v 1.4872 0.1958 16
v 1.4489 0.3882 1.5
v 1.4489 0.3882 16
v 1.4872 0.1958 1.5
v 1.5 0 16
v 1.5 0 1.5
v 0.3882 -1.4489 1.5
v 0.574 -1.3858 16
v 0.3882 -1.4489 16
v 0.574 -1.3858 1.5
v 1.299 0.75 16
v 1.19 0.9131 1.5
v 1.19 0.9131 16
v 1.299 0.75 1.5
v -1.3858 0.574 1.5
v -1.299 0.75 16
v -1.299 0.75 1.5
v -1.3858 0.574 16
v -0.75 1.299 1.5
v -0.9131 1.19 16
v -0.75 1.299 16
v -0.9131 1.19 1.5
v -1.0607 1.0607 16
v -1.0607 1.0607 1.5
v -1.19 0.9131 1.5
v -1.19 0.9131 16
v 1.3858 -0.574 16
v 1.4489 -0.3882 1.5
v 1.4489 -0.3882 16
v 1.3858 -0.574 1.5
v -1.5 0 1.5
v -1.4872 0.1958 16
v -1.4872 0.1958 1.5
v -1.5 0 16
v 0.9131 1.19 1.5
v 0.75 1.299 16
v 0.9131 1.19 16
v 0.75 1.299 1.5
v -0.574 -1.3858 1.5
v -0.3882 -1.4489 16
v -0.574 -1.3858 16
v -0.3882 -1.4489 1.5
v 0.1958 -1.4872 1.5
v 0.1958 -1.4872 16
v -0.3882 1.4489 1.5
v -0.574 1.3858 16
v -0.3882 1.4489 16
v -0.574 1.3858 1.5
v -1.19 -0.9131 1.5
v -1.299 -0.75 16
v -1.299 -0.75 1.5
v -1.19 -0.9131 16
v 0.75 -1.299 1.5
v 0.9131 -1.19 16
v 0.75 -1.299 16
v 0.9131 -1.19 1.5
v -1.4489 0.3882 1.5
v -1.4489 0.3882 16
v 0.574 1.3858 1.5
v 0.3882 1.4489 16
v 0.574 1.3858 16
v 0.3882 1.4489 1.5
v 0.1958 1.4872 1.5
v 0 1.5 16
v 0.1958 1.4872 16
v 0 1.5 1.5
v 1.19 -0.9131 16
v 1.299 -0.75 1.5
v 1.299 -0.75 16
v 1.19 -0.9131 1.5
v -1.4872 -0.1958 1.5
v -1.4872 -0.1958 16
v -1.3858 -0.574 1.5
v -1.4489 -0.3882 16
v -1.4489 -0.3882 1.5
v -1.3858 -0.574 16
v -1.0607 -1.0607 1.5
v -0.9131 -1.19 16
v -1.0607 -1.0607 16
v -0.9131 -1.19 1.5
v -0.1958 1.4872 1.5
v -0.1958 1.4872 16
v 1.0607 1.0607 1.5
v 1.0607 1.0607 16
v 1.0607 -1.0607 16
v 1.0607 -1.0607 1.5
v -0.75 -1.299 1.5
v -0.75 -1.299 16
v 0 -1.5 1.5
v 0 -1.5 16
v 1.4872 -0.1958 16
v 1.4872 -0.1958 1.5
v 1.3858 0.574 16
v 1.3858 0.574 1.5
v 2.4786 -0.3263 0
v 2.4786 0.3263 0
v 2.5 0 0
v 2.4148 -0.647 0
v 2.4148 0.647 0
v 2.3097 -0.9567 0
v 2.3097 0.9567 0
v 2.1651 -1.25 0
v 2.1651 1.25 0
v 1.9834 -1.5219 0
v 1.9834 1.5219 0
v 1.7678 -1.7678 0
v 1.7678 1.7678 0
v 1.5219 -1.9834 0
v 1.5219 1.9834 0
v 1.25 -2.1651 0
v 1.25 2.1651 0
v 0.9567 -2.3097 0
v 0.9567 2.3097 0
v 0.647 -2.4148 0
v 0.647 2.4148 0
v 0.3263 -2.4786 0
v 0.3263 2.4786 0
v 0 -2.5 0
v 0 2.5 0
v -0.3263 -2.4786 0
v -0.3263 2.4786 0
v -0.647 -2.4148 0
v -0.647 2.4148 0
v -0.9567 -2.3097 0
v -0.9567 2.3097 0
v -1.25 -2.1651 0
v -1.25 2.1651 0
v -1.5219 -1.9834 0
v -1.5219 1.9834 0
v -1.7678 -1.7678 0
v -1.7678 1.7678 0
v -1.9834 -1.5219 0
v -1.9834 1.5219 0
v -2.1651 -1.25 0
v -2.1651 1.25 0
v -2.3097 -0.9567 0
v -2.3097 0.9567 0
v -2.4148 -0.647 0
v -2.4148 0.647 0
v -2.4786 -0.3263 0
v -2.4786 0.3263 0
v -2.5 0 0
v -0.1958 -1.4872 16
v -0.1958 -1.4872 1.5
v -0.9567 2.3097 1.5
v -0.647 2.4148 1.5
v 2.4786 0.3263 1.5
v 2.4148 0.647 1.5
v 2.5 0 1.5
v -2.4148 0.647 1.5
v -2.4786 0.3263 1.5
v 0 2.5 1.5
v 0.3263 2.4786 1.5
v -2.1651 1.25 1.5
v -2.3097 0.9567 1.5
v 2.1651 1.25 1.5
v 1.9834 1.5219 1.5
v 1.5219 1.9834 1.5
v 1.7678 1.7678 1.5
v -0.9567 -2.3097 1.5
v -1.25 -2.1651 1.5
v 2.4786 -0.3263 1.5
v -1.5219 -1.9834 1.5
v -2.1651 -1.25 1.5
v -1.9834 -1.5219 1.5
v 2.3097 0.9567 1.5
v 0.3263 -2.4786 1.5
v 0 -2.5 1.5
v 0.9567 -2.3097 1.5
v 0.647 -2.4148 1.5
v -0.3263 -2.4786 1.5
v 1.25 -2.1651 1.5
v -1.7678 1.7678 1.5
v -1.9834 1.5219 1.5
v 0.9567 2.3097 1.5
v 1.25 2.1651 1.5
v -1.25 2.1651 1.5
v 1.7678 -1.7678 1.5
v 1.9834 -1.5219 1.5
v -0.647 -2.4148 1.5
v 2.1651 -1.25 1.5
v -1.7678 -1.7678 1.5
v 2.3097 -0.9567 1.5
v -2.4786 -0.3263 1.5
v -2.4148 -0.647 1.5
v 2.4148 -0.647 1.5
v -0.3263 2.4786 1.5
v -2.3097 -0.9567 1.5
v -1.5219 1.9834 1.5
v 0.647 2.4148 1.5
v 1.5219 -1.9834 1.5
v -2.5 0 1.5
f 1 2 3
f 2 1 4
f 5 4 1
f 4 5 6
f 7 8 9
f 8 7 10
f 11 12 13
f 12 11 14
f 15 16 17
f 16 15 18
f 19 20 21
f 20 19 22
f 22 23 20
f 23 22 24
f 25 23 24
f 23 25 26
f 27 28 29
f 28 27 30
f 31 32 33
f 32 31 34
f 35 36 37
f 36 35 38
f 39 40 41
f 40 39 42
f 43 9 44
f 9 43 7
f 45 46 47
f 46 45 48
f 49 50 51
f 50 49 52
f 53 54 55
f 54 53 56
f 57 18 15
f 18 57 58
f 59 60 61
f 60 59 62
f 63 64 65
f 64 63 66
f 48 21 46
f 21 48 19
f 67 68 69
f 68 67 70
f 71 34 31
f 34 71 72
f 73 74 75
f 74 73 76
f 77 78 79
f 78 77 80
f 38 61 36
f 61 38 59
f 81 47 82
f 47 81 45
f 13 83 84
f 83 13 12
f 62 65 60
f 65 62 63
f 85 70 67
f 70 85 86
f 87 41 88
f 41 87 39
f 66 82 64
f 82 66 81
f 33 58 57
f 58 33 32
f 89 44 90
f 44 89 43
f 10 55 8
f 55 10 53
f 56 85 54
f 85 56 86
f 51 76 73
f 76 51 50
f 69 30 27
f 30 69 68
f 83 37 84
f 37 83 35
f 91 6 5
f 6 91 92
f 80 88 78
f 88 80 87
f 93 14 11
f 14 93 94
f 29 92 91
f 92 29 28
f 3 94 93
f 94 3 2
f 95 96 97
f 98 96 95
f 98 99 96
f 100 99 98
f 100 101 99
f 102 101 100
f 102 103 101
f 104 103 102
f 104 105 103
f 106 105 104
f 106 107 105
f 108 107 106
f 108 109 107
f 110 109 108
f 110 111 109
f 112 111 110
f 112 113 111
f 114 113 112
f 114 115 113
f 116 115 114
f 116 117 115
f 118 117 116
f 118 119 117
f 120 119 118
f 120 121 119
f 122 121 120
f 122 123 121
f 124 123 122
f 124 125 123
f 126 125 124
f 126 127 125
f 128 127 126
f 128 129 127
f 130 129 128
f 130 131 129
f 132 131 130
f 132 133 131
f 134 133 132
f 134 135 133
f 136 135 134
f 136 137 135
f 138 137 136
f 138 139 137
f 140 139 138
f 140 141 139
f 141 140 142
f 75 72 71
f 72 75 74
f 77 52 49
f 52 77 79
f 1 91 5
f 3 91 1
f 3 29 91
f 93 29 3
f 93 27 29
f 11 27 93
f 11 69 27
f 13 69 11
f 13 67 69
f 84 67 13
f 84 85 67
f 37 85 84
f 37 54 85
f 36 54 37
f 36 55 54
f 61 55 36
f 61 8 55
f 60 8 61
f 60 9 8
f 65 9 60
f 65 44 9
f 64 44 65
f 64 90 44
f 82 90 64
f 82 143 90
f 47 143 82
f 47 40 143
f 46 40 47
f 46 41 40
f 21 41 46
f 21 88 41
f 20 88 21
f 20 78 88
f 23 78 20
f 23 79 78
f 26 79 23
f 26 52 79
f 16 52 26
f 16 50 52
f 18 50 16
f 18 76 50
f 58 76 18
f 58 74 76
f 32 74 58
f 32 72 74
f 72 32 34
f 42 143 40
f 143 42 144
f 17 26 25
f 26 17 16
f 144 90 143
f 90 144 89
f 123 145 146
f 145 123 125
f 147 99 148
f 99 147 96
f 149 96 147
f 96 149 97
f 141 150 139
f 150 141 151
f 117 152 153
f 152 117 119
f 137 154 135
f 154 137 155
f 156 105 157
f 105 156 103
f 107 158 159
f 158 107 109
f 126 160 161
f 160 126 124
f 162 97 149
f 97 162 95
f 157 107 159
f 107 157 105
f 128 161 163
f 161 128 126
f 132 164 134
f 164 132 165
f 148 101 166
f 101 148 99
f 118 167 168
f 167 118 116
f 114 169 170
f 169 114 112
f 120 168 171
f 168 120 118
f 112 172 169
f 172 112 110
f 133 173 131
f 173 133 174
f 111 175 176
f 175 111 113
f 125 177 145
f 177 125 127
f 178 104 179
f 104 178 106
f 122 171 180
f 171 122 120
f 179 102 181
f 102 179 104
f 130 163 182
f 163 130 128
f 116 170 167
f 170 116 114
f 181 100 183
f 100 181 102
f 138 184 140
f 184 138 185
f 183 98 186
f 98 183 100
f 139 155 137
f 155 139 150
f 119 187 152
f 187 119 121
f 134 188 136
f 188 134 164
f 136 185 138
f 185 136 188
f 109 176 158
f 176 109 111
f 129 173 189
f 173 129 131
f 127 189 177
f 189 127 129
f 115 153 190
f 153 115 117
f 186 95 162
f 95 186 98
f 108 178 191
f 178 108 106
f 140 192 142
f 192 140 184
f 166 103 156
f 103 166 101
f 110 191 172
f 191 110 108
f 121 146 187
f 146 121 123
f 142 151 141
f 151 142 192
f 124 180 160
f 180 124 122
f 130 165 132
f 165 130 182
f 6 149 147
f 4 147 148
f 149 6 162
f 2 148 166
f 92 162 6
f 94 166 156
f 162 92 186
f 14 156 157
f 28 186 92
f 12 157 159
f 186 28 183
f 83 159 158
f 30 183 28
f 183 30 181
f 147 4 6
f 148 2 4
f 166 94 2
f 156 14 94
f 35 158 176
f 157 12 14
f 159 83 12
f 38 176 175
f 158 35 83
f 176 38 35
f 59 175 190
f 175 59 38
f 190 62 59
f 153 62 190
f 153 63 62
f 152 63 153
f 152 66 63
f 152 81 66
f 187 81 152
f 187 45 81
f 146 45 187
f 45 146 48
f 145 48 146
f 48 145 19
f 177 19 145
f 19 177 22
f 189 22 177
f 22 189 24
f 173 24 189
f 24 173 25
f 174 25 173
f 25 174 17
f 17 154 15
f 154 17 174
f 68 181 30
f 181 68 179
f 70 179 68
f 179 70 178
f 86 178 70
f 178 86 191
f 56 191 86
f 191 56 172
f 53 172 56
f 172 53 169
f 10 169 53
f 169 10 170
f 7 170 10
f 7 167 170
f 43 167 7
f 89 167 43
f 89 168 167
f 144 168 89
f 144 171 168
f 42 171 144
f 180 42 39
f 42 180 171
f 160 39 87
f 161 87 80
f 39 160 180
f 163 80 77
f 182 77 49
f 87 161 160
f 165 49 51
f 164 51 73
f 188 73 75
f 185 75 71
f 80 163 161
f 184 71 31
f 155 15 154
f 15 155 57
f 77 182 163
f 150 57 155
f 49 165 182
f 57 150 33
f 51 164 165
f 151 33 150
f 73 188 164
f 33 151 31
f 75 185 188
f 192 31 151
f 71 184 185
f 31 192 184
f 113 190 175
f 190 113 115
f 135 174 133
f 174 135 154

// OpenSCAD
// file: params.scad
/*
 * params.scad — every dimension the printed parts share, in millimetres.
 * ======================================================================
 * Included by all cad/*.scad files. No dimension may be duplicated in a part
 * file; if two parts need the same number, it lives here.
 *
 * Values marked MEASURE are design targets until caliper measurements of a real
 * X240 top section replace them (issue #44). Everything else is a design choice.
 */

// ---------------------------------------------------------------- deck / case
case_width  = 309.0;   // MEASURE  X, left to right, at the deck's mating surface
case_depth  = 210.0;   // MEASURE  Y, front (palmrest) to back
wall_t      = 2.5;     // PETG shell wall
corner_r    = 3.0;     // MEASURE  outer corner radius
internal_h  = 18.0;    // floor-to-deck clearance (see docs/enclosure/integration.md)
case_h      = internal_h + wall_t;

// Screw bosses that meet the X240 deck, from the front-left corner.  MEASURE all.
deck_boss_positions = [
    [  8.0,   8.0 ], [ 60.0,   8.0 ], [150.0,   8.0 ], [250.0,   8.0 ], [301.0,   8.0 ],
    [  8.0, 202.0 ], [150.0, 202.0 ], [301.0, 202.0 ],
];
boss_od = 6.0;
boss_id = 3.2;         // M2 heat-set insert hole (insert OD ~3.2 for a 3.5 mm body)

// ---------------------------------------------------------------- split joint
split      = true;     // print as two halves (fits a 220 mm bed); false = one piece
split_x    = case_width / 2;
tab_count  = 3;        // dovetail tabs along the floor seam
tab_w      = 14.0;     // tab width at the seam
tab_flare  = 3.0;      // extra width at the tip (dovetail angle)
tab_len    = 10.0;     // how far the tab reaches into the other half
joint_gap  = 0.15;     // clearance per face; tune with a 30 mm coupon
pin_d      = 3.0;      // alignment pins through the front/rear walls
pin_len    = 10.0;

// ---------------------------------------------------------------- board / sled
board_w    = 100.0;    // stripboard or Rev B PCB
board_d    = 80.0;
board_hole_inset = 4.0;                  // M2 holes this far from each board corner
board_hole_d     = 2.4;
sled_margin      = 6.0;                  // sled extends this far past the board
sled_t           = 2.0;
sled_standoff_h  = 6.0;                  // board sits this high above the sled
sled_standoff_od = 5.0;
// sled centre in the case (rear-centre; see docs/enclosure/integration.md)
sled_center = [ case_width / 2, case_depth - 8 - board_d / 2 - sled_margin - 6 ];
// sled-to-case bosses (around the sled, two per half so the sled bridges the seam)
sled_boss_offsets = [ [-56, -46], [56, -46], [-56, 46], [56, 46] ];

// ---------------------------------------------------------------- Pico
pico_w = 51.0;
pico_d = 21.0;
pico_h = 1.0;          // PCB thickness
pico_hole_d = 2.1;     // Pico mounting holes, 11.4 x 47 mm pattern
pico_hole_dx = 47.0;
pico_hole_dy = 11.4;

// ---------------------------------------------------------------- USB
usb_c     = false;                     // false = Micro-USB cutout, true = USB-C
usb_w     = usb_c ? 9.5 : 8.5;
usb_h     = usb_c ? 4.0 : 3.5;
usb_x     = sled_center[0];            // cutout centred on the board
usb_z     = wall_t + sled_t + sled_standoff_h + 1.6;   // bottom of the Pico's connector
cable_d   = 4.5;                       // USB cable jacket diameter
relief_w  = 22.0;                      // strain-relief bezel footprint
relief_d  = 12.0;
relief_h  = 10.0;

// ---------------------------------------------------------------- FPC
fpc_w        = 22.0;   // 40-pin 0.5 mm cable width
fpc_t        = 0.3;
fpc_min_r    = 5.0;    // minimum bend radius
clickpad_fpc_w = 8.0;  // MEASURE  ClickPad cable width
zif_body_w   = 26.0;   // 40-pin ZIF connector body length along the cable edge
zif_body_d   = 6.0;
zif_body_h   = 5.0;
zif_cp_body_w = 12.0;  // ClickPad ZIF body (pin count from probing)

// ---------------------------------------------------------------- gasket, vents, feet
gasket_depth = 1.2;
gasket_width = 2.0;
vents        = false;  // not thermally needed (docs/enclosure/durability.md)
vent_w = 40.0; vent_h = 2.0; vent_count = 4; vent_spacing = 6.0;
ribs         = true;   // two front-to-back stiffening ribs in the floor
rib_t        = 2.0;
rib_h        = 4.0;

foot_d       = 10.0;   // rubber feet, front
foot_recess  = 1.0;
foot_positions = [ [25, 20], [case_width - 25, 20] ];
tilt_positions = [ [25, case_depth - 20], [case_width - 25, case_depth - 20] ];
tilt_h       = 12.0;   // rear riser height
tilt_w       = 30.0;
tilt_d       = 20.0;
tilt_screw_d = 3.4;    // M3 clearance

// ---------------------------------------------------------------- LED light pipe
pipe_d       = 3.0;
pipe_flange_d= 5.0;
pipe_len     = internal_h - 2;
pipe_position = [ sled_center[0] + board_w / 2 + 15, sled_center[1] - 20 ];  // beside the touchpad

// ---------------------------------------------------------------- printing
fit      = 0.2;        // general hole clearance for printed-in-place fits
$fn      = 48;
// main file
/*
 * led_light_pipe.scad — carries the touchpad LED to the deck surface
 * ==================================================================
 * Print in clear PETG or natural PLA, 100 % infill, standing up, and polish
 * the tip.  Press-fits into the floor aperture (pipe_position in params.scad);
 * the flange stops it from pushing through.  The LED sits under the flange end.
 */
include <params.scad>

module light_pipe() {
    cylinder(h = pipe_len, d = pipe_d);
    cylinder(h = 1.5, d = pipe_flange_d);
}

light_pipe();
